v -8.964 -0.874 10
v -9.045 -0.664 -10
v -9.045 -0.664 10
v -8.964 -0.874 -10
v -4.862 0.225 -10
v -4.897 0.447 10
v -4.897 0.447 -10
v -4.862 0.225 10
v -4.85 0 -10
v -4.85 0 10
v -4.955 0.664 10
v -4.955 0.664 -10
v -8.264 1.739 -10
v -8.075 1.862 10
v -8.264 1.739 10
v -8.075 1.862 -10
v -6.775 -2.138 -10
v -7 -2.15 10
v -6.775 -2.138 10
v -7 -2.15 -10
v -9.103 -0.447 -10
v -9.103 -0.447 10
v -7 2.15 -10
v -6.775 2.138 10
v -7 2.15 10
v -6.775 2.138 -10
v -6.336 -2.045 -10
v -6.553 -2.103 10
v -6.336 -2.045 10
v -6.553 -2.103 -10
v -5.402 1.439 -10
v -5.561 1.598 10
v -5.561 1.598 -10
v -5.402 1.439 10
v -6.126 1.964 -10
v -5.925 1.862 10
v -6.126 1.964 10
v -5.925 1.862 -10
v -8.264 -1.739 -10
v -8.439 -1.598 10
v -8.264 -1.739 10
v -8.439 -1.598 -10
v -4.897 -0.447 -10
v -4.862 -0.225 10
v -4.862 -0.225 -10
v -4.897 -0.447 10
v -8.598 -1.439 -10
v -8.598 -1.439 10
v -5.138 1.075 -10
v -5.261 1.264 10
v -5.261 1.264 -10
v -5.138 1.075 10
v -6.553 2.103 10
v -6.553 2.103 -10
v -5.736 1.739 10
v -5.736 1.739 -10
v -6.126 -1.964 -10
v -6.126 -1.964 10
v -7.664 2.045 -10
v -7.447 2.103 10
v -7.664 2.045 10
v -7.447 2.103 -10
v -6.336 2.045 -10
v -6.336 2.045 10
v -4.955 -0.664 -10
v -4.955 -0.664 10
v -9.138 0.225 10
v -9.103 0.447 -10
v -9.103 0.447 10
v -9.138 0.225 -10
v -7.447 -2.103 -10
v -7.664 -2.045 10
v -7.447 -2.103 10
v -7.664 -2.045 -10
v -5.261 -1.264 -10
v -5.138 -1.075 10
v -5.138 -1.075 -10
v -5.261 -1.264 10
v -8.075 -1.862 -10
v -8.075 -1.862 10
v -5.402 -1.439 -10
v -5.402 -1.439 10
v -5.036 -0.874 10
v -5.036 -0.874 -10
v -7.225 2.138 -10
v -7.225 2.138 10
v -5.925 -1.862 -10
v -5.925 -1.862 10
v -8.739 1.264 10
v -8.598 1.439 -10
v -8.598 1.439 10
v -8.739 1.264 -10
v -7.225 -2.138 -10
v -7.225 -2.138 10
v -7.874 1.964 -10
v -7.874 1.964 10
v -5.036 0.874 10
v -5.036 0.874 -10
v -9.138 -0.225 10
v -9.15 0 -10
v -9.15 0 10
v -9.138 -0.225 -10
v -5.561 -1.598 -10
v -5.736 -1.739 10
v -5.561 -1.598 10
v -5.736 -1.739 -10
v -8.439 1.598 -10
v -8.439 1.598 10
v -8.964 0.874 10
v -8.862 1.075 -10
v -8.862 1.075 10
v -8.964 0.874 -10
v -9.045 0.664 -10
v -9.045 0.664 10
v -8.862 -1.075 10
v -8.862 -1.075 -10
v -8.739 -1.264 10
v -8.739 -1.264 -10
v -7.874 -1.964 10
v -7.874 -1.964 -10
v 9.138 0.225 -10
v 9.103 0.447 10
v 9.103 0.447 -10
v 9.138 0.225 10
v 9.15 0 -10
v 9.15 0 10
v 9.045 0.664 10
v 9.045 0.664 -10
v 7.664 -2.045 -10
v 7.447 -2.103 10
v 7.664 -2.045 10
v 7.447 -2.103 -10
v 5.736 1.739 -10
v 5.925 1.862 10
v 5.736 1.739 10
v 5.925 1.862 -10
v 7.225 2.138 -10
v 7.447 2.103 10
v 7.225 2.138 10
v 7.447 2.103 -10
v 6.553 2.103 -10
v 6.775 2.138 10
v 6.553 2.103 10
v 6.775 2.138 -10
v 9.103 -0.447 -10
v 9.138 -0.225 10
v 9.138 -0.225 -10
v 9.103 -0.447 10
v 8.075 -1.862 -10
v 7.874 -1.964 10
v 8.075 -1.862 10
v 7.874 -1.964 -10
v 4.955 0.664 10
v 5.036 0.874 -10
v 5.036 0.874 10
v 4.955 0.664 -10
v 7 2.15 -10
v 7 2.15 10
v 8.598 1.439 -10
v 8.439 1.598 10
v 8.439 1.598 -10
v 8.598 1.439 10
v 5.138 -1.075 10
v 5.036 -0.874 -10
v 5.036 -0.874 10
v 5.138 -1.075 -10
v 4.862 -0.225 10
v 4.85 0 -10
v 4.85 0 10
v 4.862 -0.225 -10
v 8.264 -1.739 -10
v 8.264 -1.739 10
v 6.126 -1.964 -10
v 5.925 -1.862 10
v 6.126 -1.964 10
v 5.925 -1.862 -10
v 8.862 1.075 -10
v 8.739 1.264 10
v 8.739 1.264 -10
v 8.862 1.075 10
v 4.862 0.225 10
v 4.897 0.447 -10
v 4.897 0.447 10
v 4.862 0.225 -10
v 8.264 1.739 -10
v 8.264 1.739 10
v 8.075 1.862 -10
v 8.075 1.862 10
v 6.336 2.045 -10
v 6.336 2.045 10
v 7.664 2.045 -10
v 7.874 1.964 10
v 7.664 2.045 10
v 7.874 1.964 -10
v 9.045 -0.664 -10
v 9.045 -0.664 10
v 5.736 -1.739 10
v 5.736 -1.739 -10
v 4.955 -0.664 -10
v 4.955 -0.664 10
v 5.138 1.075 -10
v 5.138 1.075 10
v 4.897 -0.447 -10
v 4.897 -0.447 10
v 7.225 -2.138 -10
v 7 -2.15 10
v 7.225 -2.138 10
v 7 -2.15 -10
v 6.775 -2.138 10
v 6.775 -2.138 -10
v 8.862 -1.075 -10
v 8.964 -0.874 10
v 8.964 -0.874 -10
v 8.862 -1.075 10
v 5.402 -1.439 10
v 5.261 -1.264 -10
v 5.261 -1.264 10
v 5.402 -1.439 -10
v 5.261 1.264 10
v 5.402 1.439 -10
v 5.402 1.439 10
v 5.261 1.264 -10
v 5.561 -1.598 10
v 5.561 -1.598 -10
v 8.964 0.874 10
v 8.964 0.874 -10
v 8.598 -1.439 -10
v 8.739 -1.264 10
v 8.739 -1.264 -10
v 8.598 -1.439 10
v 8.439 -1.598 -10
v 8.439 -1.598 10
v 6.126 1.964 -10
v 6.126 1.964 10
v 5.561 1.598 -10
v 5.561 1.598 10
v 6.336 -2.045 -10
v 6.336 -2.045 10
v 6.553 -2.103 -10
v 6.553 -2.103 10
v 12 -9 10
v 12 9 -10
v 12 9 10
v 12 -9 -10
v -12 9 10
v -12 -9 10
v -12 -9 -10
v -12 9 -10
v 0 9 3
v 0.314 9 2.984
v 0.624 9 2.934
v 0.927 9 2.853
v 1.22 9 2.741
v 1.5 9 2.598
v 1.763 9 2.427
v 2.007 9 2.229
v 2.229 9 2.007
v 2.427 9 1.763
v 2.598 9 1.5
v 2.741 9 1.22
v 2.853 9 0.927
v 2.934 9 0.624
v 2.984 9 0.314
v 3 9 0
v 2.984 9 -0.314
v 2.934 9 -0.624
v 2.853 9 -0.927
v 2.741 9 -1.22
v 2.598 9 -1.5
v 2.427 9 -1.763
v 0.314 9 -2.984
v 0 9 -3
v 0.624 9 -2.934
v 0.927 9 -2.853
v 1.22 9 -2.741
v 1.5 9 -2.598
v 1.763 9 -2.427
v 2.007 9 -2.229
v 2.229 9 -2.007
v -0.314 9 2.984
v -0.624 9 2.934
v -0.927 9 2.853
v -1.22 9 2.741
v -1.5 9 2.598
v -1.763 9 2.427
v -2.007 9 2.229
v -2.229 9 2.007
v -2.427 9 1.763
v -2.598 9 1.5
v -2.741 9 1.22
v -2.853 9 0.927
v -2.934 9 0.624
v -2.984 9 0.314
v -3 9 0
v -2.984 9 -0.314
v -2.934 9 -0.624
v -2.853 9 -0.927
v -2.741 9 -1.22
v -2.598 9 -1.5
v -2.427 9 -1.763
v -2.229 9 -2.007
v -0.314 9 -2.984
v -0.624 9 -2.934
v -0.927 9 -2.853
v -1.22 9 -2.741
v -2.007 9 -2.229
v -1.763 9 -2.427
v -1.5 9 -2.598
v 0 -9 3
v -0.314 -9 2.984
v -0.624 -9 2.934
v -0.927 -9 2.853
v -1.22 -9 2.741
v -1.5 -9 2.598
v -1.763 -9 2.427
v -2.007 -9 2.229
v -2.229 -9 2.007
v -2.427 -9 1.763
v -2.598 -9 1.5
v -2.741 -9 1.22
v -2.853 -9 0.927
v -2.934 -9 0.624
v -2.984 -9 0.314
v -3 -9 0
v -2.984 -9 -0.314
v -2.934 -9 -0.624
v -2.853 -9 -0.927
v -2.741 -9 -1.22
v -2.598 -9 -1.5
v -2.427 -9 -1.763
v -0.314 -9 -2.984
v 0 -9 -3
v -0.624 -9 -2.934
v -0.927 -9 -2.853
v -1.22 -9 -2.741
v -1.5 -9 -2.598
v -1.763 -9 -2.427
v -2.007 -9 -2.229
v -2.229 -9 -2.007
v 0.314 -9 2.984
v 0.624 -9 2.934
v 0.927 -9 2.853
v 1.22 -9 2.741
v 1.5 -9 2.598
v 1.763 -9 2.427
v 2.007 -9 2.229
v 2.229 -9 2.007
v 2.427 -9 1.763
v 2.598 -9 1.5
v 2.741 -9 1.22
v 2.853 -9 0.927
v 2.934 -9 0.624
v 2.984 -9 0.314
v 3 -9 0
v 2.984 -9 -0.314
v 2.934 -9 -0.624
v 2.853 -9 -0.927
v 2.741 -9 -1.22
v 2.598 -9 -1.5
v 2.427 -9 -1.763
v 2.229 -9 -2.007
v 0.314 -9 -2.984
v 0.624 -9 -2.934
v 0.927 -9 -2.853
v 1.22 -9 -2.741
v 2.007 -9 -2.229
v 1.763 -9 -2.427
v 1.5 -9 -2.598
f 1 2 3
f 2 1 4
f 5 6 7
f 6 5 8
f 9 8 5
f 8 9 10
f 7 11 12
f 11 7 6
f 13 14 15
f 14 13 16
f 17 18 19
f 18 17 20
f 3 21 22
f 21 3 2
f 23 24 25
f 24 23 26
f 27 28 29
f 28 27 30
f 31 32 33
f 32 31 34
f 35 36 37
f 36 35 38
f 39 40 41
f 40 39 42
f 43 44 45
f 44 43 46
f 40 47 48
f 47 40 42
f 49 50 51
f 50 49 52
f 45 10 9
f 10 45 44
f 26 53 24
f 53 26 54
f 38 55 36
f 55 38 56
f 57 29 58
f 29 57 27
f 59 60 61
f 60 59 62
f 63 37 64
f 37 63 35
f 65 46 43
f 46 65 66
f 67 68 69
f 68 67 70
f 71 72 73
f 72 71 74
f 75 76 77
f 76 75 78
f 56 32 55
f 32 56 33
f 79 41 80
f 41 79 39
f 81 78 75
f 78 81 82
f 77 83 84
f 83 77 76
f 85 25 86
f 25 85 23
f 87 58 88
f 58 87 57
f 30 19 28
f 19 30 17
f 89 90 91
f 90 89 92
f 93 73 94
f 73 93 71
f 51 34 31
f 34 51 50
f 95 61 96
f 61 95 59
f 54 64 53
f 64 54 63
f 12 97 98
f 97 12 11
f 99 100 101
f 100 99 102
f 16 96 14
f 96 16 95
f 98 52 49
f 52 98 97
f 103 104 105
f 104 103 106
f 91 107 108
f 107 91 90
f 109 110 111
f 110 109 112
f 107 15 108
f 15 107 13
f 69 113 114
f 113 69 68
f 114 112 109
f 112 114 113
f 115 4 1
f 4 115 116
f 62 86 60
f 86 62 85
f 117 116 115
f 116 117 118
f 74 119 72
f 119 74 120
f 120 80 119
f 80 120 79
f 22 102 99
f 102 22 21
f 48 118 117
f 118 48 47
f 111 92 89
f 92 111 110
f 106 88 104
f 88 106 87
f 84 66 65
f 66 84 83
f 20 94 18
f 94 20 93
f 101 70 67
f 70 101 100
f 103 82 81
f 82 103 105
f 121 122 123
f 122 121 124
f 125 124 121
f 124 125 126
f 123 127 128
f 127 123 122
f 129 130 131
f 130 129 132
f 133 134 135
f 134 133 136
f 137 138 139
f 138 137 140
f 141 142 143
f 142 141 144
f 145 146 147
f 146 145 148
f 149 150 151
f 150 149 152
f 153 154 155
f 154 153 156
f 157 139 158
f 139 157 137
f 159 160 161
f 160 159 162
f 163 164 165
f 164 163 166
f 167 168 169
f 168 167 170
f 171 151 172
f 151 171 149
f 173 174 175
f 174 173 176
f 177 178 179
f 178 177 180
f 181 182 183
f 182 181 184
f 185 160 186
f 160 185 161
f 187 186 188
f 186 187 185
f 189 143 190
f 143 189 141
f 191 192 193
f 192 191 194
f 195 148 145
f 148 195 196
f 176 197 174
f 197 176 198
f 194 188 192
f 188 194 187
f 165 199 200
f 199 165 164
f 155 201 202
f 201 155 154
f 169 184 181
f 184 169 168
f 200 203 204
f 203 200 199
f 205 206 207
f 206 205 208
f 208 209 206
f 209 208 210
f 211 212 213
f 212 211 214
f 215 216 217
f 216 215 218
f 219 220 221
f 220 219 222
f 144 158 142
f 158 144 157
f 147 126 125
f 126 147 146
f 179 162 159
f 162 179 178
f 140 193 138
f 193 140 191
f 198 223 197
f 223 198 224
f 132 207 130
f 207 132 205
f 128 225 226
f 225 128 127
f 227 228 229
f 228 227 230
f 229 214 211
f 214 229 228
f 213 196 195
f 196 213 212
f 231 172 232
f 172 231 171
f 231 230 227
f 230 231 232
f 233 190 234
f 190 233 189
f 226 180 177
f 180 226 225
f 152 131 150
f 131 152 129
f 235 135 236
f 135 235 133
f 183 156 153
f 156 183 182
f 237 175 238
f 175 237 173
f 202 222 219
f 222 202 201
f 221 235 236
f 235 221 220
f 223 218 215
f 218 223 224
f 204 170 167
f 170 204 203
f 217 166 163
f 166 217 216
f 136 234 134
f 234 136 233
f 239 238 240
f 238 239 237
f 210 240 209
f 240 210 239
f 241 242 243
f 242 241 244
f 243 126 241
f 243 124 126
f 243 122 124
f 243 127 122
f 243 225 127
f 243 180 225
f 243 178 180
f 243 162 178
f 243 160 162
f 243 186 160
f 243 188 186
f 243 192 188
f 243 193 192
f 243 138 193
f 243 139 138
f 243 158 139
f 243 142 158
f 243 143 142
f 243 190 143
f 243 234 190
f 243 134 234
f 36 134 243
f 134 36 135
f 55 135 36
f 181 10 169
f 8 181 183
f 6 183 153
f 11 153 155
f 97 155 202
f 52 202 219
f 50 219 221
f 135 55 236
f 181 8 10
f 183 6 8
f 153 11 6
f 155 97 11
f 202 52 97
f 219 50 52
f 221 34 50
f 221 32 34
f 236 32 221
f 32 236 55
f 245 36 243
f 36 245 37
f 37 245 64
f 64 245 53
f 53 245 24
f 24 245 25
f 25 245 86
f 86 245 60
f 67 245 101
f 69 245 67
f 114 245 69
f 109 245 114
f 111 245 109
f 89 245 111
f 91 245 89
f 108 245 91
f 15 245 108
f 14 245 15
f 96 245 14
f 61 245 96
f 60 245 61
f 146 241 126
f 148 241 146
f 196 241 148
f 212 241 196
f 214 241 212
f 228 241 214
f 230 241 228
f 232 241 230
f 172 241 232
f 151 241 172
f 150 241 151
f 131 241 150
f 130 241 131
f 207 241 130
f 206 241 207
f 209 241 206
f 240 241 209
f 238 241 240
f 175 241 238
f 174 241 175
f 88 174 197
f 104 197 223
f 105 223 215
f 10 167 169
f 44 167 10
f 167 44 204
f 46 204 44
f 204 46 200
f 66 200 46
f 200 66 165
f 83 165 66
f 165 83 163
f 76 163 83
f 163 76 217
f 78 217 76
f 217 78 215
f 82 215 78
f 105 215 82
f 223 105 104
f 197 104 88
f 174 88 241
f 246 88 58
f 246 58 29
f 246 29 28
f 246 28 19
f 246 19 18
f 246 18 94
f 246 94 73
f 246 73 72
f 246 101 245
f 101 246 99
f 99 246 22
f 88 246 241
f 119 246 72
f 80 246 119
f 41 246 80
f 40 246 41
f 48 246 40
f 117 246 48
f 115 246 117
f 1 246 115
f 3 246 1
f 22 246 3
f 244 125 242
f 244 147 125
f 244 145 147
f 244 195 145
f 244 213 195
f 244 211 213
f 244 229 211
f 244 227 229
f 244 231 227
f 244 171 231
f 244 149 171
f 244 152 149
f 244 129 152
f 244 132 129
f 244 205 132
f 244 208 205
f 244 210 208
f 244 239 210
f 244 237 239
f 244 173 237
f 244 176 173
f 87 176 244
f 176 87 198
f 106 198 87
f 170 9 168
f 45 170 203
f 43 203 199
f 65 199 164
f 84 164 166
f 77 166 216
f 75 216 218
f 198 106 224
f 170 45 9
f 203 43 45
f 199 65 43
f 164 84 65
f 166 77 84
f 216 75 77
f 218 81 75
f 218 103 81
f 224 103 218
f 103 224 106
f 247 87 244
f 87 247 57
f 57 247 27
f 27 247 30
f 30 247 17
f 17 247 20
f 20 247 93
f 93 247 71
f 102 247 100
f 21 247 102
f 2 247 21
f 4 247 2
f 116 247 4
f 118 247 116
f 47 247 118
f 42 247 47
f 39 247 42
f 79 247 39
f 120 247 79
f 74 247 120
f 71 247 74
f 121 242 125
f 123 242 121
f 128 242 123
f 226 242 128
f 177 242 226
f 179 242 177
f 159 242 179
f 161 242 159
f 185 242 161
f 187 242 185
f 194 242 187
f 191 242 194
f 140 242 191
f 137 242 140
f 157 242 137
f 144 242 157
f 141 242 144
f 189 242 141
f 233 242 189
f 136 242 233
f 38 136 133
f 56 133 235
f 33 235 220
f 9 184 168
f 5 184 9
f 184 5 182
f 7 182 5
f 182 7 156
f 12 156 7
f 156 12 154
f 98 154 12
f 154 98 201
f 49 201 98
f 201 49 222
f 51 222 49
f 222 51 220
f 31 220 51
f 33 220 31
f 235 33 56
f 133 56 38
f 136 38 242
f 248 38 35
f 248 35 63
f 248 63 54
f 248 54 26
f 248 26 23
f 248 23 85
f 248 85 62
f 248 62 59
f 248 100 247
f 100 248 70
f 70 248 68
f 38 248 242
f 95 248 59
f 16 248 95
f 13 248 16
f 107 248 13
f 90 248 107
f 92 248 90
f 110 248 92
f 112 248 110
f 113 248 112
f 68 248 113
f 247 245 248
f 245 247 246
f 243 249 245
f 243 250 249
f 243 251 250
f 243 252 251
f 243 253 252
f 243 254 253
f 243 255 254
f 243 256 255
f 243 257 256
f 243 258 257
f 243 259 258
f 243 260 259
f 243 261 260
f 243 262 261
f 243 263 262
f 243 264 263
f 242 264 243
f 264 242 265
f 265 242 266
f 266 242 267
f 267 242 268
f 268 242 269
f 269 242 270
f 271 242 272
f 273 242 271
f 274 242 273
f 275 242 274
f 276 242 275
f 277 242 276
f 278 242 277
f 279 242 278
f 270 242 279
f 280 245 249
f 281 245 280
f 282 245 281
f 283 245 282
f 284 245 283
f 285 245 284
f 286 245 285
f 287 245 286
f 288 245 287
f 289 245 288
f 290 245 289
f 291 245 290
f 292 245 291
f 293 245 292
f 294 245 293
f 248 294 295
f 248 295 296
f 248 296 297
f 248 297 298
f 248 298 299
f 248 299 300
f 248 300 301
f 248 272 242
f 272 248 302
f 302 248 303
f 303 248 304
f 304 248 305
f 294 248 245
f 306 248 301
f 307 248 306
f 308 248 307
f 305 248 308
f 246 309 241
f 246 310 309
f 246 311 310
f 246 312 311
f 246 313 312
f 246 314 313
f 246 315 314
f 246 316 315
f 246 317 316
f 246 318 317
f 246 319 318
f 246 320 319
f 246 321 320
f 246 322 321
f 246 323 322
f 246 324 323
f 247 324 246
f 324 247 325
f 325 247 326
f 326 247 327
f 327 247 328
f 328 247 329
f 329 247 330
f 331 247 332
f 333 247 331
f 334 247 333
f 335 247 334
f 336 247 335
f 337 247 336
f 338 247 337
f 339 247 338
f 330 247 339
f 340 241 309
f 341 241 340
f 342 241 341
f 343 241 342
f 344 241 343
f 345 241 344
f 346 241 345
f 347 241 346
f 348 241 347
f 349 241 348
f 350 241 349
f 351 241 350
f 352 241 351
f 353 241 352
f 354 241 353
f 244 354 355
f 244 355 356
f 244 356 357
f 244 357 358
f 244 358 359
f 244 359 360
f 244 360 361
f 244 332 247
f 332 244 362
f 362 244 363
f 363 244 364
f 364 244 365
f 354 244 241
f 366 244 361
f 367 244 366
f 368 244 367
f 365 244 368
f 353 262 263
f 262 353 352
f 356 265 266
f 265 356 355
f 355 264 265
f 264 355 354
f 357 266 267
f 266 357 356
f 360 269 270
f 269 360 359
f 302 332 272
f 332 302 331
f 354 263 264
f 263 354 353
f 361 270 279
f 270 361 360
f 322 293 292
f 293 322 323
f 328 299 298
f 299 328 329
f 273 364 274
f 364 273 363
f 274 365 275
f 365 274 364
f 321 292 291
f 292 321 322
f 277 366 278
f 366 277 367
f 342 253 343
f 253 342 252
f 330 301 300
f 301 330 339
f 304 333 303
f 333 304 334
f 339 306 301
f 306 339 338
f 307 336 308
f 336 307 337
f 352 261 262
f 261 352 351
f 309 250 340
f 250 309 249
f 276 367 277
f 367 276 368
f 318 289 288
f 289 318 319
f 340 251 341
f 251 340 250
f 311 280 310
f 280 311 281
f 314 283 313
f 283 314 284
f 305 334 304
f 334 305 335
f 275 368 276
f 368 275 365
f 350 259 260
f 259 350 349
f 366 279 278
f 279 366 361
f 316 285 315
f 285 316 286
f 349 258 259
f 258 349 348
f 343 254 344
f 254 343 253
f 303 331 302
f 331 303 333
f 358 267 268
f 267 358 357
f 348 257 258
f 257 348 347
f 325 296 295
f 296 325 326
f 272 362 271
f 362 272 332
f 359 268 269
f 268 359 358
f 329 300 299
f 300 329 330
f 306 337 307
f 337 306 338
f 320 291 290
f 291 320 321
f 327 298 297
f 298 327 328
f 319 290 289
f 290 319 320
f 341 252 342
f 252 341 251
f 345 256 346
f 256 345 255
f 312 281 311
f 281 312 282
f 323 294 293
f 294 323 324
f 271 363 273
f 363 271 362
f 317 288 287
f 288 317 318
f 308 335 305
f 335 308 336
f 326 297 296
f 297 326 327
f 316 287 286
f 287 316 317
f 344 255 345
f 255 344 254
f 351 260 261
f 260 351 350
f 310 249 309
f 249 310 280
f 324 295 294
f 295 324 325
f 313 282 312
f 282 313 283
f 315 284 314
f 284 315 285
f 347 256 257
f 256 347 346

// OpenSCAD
// Linear rail stop block.
$fn = 60;
eps = 0.02;
width = 18;
height = 20;
bore_d = 6;
length = 24;
difference() {
    cube([length,width,height],center=true);
    translate([0,-width/2-eps,0]) rotate([-90,0,0]) cylinder(d=bore_d,h=width+2*eps);
    for(x=[-7,7]) translate([x,0,-height/2-eps]) cylinder(d=4.3,h=height+2*eps);
}
